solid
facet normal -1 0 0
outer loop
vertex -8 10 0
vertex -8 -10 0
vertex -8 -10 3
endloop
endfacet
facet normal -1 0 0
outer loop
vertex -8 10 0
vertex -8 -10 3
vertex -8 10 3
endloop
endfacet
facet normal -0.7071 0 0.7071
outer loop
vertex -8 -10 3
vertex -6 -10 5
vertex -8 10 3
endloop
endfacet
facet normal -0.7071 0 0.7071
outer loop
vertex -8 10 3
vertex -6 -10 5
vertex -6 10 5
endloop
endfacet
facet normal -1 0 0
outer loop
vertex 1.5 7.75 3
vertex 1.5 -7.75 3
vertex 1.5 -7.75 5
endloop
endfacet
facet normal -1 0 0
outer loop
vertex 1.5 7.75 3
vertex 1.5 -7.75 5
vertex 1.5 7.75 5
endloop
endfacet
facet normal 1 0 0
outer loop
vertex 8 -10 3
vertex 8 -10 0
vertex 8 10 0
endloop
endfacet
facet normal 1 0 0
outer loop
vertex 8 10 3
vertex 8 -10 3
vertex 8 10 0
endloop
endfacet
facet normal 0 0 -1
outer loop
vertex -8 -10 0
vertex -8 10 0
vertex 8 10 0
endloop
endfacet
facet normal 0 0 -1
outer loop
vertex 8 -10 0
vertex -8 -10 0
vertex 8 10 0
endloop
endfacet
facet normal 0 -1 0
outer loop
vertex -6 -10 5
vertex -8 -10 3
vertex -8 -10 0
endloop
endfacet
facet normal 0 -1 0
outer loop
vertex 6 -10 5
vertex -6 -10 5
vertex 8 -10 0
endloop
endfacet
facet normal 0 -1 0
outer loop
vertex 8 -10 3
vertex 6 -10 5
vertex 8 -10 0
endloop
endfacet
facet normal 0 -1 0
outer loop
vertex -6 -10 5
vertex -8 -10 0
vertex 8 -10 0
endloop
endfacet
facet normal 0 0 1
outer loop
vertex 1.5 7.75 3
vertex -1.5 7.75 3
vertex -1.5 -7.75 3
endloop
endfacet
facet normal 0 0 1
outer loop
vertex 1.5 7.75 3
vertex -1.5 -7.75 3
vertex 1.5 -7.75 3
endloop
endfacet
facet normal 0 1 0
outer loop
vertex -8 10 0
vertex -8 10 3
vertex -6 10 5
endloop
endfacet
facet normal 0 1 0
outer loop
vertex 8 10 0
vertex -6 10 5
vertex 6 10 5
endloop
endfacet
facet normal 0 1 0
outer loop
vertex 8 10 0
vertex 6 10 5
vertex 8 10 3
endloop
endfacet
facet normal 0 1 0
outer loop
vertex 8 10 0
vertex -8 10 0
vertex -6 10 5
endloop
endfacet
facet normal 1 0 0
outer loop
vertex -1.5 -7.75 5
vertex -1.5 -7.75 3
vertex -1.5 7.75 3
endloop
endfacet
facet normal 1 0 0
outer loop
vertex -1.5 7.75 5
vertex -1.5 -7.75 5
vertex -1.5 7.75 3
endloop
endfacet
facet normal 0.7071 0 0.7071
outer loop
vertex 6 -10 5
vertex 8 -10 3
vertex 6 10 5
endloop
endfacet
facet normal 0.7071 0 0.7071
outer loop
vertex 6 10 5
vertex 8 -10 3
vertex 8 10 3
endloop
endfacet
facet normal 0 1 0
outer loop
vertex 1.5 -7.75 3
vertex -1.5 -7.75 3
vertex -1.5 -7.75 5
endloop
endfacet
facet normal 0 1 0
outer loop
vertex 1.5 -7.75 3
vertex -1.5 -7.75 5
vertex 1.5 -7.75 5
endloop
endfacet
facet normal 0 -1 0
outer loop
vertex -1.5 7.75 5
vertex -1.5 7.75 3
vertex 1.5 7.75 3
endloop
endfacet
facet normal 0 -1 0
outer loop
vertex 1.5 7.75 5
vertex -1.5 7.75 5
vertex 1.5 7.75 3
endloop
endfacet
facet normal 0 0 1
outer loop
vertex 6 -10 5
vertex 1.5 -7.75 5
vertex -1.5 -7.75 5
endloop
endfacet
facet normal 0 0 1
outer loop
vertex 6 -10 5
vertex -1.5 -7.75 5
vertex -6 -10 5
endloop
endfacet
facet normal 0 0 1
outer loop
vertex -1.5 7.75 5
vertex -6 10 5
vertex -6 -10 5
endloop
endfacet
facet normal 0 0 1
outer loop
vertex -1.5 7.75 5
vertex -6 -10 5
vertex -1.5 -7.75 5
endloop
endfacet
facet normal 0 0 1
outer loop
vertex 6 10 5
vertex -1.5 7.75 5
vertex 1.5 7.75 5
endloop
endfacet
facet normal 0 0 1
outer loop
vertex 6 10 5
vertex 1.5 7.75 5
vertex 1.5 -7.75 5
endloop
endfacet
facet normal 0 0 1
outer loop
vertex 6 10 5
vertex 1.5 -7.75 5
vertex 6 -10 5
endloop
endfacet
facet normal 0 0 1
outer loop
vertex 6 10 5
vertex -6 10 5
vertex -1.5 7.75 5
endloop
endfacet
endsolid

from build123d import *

# Parameters (mm, degrees)
F1_DEPTH = 3
F0_W     = 16
F0_H     = 20
F0_W_2   = 3
F0_H_2   = 15.5
F2_DEPTH = 5
F3_SIZE  = 2


with BuildPart() as f1:
    # F0 (on Top) → F1 (new body)
    with BuildSketch(Plane.XY):
        Polygon((1.5, -7.75), (1.5, 7.75), (-1.5, 7.75), align=None)
        Polygon((1.5, -7.75), (-1.5, 7.75), (-1.5, -7.75), align=None)
    extrude(amount=F1_DEPTH)

    # F0 (on Top) → F2 (join)
    with BuildSketch(Plane.XY):
        Rectangle(F0_W, F0_H)
        Rectangle(F0_W_2, F0_H_2, mode=Mode.SUBTRACT)
    extrude(amount=F2_DEPTH)

    # F3
    f3_edges = [f1.edges().sort_by_distance(p)[0] for p in [
        (8, 0, 5),
        (-8, 0, 5),
    ]]
    chamfer(f3_edges, length=F3_SIZE)


solid = f1.part
